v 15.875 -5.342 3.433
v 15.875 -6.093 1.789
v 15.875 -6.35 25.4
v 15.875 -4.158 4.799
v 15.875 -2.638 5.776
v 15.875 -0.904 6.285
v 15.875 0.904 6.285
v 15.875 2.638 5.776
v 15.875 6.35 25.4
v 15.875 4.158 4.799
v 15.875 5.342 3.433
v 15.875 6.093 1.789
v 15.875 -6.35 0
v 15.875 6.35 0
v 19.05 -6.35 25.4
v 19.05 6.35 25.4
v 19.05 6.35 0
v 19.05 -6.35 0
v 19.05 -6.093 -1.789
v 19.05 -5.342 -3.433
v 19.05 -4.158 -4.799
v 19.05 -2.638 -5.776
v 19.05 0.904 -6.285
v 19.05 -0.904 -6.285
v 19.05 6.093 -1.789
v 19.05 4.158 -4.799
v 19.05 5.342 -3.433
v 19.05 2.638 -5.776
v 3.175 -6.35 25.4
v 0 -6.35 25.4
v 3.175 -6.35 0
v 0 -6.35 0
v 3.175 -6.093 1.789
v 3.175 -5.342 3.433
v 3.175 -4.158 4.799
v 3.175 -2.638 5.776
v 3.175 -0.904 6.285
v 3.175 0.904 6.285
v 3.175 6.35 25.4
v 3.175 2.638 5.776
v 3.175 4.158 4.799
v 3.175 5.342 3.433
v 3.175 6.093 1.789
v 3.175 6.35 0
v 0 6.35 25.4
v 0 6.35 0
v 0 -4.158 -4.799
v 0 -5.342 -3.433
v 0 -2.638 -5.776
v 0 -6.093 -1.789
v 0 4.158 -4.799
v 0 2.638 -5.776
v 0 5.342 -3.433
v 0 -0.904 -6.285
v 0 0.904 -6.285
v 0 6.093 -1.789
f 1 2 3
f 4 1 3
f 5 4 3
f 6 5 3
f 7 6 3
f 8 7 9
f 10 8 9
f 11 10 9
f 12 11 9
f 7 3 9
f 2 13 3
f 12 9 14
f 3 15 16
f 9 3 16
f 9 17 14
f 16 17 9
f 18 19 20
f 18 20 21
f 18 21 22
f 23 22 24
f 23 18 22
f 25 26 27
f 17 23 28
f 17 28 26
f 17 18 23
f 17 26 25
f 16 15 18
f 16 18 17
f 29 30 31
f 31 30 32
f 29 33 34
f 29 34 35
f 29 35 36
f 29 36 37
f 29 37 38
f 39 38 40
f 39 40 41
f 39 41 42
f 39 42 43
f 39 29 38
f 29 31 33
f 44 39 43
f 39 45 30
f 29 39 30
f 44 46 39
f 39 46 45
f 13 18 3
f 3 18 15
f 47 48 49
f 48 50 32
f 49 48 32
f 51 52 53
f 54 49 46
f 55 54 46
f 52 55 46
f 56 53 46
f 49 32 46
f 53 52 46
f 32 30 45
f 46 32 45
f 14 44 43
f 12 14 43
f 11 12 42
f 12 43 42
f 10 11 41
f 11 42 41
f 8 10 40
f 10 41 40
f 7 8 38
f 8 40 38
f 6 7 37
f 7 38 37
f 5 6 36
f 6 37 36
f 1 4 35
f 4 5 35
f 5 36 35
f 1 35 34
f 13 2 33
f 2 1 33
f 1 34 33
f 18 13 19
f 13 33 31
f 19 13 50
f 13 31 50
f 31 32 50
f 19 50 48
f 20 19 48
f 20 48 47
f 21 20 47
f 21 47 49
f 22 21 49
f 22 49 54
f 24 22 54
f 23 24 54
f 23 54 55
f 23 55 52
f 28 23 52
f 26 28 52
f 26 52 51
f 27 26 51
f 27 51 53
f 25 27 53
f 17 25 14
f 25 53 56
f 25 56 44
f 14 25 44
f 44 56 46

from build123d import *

# Parameters (mm, degrees)
F1_DEPTH = 19.05
F2_DEPTH = 3.175
F3_W     = 12.7
F3_H     = 25.4
F4_DEPTH = 3.175


with BuildPart() as f1:
    # F0 (on Right) → F1 (new body)
    with BuildSketch(Plane.YZ):
        with BuildLine():
            ThreePointArc((-6.35, 0), (0, -6.35), (6.35, 0))
            ThreePointArc((6.35, 0), (0, 6.35), (-6.35, 0))
        make_face()
    extrude(amount=F1_DEPTH)

    # F0 (on Right) → F2 (join)
    with BuildSketch(Plane.YZ):
        with BuildLine():
            ThreePointArc((-6.35, 0), (0, -6.35), (6.35, 0))
            ThreePointArc((6.35, 0), (0, 6.35), (-6.35, 0))
        make_face()
        with BuildLine():
            ThreePointArc((-6.35, 0), (0, 6.35), (6.35, 0))
            Line((6.35, 0), (6.35, 25.4))
            Line((6.35, 25.4), (-6.35, 25.4))
            Line((-6.35, 25.4), (-6.35, 0))
        make_face()
    extrude(amount=F2_DEPTH)

    # F3 (on face) → F4 (join)
    with BuildSketch(Plane.YZ.offset(19.05)):
        with Locations((0, 12.7)):
            Rectangle(F3_W, F3_H)
    extrude(amount=-F4_DEPTH)


solid = f1.part
